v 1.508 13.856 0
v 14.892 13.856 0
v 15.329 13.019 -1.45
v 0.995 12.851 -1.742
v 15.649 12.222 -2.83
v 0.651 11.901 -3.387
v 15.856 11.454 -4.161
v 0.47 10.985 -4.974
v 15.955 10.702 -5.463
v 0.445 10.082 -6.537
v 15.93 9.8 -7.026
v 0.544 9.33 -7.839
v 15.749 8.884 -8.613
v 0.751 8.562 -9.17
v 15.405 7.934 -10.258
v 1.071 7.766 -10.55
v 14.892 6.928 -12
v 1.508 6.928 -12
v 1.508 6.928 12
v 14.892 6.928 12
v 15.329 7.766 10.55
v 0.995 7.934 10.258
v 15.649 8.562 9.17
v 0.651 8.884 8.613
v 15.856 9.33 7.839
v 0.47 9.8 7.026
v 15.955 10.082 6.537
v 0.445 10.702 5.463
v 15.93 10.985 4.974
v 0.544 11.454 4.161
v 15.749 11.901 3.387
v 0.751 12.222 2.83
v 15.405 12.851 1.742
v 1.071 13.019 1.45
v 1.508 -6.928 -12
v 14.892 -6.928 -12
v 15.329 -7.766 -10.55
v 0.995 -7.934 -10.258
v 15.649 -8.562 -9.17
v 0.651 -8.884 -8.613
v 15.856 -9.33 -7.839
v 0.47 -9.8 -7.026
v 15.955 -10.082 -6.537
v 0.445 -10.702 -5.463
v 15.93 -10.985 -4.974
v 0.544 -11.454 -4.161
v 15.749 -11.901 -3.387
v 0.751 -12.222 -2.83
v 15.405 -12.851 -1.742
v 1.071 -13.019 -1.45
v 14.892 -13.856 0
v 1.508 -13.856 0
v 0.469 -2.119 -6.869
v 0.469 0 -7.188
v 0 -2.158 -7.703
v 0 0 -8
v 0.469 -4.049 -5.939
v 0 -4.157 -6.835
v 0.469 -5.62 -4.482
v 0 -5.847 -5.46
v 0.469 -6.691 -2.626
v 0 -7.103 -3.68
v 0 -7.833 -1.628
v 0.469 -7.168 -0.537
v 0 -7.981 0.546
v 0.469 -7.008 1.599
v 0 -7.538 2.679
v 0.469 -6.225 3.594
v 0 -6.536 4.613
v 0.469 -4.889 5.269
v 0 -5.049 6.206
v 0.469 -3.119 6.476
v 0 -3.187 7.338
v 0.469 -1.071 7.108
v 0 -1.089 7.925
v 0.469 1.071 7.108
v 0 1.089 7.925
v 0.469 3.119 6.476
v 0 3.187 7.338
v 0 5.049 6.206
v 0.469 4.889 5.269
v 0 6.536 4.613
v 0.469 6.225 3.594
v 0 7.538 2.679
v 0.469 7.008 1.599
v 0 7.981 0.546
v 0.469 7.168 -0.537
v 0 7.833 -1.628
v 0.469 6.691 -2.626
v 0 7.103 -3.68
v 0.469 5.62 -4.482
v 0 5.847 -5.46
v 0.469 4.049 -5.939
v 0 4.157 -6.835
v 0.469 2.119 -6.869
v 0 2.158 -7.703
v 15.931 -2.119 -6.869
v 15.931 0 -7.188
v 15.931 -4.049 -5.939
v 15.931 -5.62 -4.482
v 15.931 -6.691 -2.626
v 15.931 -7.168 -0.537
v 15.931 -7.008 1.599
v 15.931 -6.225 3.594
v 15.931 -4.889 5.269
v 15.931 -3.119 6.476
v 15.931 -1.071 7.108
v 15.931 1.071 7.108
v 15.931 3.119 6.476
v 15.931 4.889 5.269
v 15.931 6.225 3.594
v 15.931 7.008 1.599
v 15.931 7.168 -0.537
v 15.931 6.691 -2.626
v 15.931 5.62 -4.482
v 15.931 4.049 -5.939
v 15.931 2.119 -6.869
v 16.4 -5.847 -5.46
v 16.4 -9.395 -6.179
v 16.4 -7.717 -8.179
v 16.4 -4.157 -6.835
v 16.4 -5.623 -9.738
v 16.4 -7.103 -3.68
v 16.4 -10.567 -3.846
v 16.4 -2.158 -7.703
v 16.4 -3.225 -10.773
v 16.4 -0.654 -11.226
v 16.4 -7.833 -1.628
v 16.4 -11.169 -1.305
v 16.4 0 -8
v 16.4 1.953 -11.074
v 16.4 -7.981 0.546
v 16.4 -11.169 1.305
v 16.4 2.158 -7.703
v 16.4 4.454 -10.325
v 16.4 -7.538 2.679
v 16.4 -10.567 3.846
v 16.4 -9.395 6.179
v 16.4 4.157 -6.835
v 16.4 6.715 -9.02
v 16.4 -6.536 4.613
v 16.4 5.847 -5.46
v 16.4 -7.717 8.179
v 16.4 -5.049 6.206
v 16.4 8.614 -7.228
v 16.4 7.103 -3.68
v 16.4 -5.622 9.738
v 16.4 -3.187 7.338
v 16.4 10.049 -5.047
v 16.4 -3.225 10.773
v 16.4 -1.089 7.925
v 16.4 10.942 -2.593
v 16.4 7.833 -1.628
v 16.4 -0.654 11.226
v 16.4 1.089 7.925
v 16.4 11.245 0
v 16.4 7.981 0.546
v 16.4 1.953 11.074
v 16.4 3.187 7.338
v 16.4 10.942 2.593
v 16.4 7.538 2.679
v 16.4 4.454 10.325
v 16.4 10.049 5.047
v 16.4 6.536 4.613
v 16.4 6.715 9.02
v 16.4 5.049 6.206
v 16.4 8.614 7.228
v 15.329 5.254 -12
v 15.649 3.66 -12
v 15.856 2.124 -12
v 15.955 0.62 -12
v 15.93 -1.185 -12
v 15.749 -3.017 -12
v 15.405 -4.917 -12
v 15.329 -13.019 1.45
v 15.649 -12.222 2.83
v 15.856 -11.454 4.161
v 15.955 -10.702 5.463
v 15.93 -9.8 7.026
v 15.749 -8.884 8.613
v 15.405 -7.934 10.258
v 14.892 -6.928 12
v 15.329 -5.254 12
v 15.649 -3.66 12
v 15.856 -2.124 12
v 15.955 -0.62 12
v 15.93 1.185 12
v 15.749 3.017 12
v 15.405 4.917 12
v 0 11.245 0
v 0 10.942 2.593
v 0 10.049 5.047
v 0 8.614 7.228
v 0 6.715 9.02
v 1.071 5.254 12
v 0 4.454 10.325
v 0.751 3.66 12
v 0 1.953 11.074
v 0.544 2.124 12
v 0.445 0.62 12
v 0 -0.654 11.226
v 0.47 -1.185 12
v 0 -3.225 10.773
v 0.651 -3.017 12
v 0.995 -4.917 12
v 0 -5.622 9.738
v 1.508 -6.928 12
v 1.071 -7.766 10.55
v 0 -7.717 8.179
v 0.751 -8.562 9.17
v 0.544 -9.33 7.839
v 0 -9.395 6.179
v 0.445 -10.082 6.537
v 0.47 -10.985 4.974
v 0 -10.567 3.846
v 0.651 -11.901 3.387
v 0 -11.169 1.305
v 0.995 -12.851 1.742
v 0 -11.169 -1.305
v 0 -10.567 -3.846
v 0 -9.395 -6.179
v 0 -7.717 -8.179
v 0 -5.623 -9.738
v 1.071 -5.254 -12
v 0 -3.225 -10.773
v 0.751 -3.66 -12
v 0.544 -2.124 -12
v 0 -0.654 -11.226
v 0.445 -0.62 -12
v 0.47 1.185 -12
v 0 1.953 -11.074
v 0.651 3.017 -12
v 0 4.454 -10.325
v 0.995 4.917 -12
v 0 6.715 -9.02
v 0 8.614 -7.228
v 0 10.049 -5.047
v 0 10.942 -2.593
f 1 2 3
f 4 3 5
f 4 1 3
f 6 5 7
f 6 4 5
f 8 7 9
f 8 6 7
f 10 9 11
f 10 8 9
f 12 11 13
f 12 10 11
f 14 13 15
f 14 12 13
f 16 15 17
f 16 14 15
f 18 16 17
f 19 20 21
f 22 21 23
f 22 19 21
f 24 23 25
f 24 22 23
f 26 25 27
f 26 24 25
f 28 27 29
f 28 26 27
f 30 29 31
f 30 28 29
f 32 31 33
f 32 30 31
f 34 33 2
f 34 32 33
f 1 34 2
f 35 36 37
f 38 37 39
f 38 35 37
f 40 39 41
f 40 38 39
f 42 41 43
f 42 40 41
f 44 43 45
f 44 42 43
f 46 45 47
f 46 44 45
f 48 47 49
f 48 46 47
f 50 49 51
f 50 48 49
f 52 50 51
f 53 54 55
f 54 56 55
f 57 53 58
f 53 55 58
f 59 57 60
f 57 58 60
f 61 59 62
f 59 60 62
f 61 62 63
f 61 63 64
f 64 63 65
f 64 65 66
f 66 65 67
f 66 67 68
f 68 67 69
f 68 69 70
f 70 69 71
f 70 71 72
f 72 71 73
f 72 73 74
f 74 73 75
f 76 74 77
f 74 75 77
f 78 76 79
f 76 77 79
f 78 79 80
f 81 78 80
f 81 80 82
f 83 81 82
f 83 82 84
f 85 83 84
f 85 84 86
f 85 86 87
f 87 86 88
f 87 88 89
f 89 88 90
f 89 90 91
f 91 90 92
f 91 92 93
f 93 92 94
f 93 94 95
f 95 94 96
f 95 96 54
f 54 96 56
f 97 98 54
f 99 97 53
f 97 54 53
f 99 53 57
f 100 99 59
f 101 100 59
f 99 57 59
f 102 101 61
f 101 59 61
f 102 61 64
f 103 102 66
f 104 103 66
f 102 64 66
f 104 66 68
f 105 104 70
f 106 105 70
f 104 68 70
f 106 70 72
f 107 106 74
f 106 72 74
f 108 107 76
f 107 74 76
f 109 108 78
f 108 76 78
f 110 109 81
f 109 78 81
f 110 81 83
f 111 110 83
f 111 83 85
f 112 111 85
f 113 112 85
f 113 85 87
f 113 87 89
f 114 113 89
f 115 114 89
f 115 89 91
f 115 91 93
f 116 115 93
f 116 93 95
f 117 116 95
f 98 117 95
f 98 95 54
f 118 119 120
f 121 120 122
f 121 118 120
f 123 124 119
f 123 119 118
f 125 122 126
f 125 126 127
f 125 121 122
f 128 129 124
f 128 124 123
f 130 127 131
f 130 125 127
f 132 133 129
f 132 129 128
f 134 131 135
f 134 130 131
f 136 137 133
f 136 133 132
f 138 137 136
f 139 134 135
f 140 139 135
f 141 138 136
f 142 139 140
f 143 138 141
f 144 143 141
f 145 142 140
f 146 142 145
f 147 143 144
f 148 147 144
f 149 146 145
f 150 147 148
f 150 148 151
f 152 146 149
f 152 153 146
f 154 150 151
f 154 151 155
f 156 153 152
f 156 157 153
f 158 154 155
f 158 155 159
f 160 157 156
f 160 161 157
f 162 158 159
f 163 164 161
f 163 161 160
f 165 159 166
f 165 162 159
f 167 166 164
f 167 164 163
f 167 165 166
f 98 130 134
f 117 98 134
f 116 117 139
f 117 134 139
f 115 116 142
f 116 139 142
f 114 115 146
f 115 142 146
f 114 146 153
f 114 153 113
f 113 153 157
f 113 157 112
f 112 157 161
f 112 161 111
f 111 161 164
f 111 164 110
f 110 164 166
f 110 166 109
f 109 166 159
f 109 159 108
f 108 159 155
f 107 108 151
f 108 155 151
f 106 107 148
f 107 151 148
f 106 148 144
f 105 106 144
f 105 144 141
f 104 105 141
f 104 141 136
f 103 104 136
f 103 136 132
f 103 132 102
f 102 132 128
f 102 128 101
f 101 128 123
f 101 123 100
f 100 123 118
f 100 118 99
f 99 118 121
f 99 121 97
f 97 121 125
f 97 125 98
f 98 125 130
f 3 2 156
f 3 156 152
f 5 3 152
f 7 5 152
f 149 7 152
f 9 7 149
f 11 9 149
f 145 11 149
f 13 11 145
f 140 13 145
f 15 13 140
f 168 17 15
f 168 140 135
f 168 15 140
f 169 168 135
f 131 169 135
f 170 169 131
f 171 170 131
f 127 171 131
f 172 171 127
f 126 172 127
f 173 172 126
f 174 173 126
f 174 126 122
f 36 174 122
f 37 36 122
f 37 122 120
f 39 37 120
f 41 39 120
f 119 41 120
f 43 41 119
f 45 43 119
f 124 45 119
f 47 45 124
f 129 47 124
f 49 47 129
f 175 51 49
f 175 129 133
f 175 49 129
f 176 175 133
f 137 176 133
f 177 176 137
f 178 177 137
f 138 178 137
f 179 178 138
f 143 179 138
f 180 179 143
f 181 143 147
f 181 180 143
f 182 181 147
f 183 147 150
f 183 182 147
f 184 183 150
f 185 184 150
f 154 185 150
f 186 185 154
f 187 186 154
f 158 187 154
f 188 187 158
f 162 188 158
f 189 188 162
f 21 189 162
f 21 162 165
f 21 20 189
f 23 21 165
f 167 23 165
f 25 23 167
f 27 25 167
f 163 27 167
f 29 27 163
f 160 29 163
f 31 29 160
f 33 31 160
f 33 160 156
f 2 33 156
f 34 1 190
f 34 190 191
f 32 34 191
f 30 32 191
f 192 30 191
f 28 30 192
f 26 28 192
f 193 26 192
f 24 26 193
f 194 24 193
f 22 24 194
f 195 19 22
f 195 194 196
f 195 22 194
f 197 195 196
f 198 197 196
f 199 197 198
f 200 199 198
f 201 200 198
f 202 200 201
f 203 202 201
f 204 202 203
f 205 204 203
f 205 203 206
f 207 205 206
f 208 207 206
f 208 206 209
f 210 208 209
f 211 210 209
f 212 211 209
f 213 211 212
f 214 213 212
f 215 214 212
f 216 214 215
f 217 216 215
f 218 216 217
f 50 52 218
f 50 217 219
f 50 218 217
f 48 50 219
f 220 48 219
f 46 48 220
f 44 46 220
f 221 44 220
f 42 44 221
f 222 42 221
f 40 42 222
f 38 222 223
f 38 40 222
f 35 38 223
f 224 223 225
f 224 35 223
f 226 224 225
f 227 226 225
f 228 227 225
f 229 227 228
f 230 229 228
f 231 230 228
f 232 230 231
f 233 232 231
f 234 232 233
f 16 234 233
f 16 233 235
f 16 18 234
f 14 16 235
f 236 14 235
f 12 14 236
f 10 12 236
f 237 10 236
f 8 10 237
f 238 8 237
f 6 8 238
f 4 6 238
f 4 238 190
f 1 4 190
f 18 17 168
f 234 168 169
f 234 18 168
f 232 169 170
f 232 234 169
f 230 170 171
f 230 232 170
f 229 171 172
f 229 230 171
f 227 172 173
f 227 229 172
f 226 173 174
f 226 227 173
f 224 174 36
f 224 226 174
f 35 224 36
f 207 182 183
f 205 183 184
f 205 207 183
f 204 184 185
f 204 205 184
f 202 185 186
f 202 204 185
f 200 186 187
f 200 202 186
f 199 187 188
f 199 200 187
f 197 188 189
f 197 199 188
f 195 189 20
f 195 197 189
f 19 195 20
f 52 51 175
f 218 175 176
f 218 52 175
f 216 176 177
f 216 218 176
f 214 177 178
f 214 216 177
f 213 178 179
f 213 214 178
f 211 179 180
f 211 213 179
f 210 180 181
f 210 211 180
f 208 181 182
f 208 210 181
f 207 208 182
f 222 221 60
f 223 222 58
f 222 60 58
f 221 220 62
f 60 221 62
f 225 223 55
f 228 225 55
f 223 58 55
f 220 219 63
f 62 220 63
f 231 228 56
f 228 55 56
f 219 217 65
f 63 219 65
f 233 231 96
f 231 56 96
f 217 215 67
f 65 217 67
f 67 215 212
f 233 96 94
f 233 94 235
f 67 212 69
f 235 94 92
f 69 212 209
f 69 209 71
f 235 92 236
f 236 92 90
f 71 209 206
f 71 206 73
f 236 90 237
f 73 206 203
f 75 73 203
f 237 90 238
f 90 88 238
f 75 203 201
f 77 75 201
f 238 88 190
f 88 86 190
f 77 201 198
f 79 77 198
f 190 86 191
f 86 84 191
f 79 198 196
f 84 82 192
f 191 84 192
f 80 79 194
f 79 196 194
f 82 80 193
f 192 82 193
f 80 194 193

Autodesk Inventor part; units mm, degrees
ref_plane "YZ Plane" through (0, 0, 0) normal (1, 0, 0) x (0, 1, 0)
ref_plane "XZ Plane" through (0, 0, 0) normal (0, 1, 0) x (-1, 0, 0)
sketch "Sketch1" plane through (0, 0, 0) normal (1, 0, 0) x (0, 1, 0)
  line L0 (-13.8564, 0) -> (-6.9282, 12)
  line L1 (-6.9282, 12) -> (6.9282, 12)
  line L2 (6.9282, 12) -> (13.8564, 0)
  line L3 (13.8564, 0) -> (6.9282, -12)
  line L4 (6.9282, -12) -> (-6.9282, -12)
  line L5 (-6.9282, -12) -> (-13.8564, 0)
  point P0 (0, 0)
  point P1 (0, 0)
  dimension "d0" = 27.7128
extrude "Body" add sketch "Sketch1" along normal blind 16.4
sketch "Sketch2" plane through (0, 0, 0) normal (0, 0, 1) x (1, 0, 0)
  line L0 (0, 6.9282) -> (0, 13.8564) projected
  line L1 (0, 13.8564) -> (16.4, 13.8564) projected
  line L2 (16.4, 6.9282) -> (16.4, 13.8564) projected
  line L3 (-3.28, 0) -> (19.68, 0) projected
  line L4 (1.5077, 13.8564) -> (0, 11.245)
  line L5 (14.8923, 13.8564) -> (16.4, 11.245)
  dimension "d3" = 30
  dimension "d4" = 30
  dimension "d5" = 22.49
  dimension "d6" = 22.49
revolve "Chamfer1" cut sketch "Sketch2" angle 360 about axis through (-10, 0, 0) along (1, 0, 0)
sketch "Sketch3" plane through (16.4, 0, 0) normal (1, 0, 0) x (0, 0, -1)
  arc A0 (-0.625, -1.0825) -> (0.625, -1.0825) centre (0, 0) ccw projected
hole "Thread" at (16.4, 0, 0) direction (-1, 0, 0) diameter 14.376 end through all thread size "M16x1.5" class "6H" standard "ISO Metric profile"
chamfer "Chamfer2" distance 0.8119 angle 30 1 edges at (16.4, 0, 7.188) measured on face at (16.4, 9.7663, -1.1858)
chamfer "Chamfer3" distance 0.8119 angle 30 1 edges at (0, 0, 7.188) measured on face at (0, 9.7663, -1.1858)
ref_plane "Work Plane1" through (-24.1737, 0, 0) normal (0, -0.866, -0.5) x (1, 0, 0)
equation "\"d0\" = 1.1547 * SW"
equation "\"d1\" = KOH"
equation "\"d8\" = -0.5 * GD1 + 0.5 * NND"
equation "\"d40\" = -0.5 * GD1 + 0.5 * NND"
equation "\"d10\" = -0.5 * GD1 + 0.5 * NND"
equation "\"d41\" = -0.5 * GD1 + 0.5 * NND"
equation "\"d3\" = ANG1"
equation "\"d4\" = ANG2"
equation "\"d5\" = SW0"
equation "\"d6\" = SW01"
equation "\"ANG1\" = 30deg"
equation "\"ANG2\" = 30deg"
equation "\"NND\" = 16"
equation "\"KOH\" = 16.4"
equation "\"SW\" = 24"
equation "\"SW0\" = 22.49"
equation "\"SW01\" = SW0"
equation "\"GUL\" = 0.541266 * PTC"
equation "\"THREADDIA\" = 16"
equation "\"TOA\" = 30deg"
equation "\"PTC\" = 1.5"
equation "\"E0\" = 26.75"
equation "\"GAL\" = 0.541266 * PTC"
equation "\"KOH1\" = 12.56"
equation "\"GD1\" = 14.376202"
properties part number "ISO 8674 - M16 x 1,5" material "Steel"
